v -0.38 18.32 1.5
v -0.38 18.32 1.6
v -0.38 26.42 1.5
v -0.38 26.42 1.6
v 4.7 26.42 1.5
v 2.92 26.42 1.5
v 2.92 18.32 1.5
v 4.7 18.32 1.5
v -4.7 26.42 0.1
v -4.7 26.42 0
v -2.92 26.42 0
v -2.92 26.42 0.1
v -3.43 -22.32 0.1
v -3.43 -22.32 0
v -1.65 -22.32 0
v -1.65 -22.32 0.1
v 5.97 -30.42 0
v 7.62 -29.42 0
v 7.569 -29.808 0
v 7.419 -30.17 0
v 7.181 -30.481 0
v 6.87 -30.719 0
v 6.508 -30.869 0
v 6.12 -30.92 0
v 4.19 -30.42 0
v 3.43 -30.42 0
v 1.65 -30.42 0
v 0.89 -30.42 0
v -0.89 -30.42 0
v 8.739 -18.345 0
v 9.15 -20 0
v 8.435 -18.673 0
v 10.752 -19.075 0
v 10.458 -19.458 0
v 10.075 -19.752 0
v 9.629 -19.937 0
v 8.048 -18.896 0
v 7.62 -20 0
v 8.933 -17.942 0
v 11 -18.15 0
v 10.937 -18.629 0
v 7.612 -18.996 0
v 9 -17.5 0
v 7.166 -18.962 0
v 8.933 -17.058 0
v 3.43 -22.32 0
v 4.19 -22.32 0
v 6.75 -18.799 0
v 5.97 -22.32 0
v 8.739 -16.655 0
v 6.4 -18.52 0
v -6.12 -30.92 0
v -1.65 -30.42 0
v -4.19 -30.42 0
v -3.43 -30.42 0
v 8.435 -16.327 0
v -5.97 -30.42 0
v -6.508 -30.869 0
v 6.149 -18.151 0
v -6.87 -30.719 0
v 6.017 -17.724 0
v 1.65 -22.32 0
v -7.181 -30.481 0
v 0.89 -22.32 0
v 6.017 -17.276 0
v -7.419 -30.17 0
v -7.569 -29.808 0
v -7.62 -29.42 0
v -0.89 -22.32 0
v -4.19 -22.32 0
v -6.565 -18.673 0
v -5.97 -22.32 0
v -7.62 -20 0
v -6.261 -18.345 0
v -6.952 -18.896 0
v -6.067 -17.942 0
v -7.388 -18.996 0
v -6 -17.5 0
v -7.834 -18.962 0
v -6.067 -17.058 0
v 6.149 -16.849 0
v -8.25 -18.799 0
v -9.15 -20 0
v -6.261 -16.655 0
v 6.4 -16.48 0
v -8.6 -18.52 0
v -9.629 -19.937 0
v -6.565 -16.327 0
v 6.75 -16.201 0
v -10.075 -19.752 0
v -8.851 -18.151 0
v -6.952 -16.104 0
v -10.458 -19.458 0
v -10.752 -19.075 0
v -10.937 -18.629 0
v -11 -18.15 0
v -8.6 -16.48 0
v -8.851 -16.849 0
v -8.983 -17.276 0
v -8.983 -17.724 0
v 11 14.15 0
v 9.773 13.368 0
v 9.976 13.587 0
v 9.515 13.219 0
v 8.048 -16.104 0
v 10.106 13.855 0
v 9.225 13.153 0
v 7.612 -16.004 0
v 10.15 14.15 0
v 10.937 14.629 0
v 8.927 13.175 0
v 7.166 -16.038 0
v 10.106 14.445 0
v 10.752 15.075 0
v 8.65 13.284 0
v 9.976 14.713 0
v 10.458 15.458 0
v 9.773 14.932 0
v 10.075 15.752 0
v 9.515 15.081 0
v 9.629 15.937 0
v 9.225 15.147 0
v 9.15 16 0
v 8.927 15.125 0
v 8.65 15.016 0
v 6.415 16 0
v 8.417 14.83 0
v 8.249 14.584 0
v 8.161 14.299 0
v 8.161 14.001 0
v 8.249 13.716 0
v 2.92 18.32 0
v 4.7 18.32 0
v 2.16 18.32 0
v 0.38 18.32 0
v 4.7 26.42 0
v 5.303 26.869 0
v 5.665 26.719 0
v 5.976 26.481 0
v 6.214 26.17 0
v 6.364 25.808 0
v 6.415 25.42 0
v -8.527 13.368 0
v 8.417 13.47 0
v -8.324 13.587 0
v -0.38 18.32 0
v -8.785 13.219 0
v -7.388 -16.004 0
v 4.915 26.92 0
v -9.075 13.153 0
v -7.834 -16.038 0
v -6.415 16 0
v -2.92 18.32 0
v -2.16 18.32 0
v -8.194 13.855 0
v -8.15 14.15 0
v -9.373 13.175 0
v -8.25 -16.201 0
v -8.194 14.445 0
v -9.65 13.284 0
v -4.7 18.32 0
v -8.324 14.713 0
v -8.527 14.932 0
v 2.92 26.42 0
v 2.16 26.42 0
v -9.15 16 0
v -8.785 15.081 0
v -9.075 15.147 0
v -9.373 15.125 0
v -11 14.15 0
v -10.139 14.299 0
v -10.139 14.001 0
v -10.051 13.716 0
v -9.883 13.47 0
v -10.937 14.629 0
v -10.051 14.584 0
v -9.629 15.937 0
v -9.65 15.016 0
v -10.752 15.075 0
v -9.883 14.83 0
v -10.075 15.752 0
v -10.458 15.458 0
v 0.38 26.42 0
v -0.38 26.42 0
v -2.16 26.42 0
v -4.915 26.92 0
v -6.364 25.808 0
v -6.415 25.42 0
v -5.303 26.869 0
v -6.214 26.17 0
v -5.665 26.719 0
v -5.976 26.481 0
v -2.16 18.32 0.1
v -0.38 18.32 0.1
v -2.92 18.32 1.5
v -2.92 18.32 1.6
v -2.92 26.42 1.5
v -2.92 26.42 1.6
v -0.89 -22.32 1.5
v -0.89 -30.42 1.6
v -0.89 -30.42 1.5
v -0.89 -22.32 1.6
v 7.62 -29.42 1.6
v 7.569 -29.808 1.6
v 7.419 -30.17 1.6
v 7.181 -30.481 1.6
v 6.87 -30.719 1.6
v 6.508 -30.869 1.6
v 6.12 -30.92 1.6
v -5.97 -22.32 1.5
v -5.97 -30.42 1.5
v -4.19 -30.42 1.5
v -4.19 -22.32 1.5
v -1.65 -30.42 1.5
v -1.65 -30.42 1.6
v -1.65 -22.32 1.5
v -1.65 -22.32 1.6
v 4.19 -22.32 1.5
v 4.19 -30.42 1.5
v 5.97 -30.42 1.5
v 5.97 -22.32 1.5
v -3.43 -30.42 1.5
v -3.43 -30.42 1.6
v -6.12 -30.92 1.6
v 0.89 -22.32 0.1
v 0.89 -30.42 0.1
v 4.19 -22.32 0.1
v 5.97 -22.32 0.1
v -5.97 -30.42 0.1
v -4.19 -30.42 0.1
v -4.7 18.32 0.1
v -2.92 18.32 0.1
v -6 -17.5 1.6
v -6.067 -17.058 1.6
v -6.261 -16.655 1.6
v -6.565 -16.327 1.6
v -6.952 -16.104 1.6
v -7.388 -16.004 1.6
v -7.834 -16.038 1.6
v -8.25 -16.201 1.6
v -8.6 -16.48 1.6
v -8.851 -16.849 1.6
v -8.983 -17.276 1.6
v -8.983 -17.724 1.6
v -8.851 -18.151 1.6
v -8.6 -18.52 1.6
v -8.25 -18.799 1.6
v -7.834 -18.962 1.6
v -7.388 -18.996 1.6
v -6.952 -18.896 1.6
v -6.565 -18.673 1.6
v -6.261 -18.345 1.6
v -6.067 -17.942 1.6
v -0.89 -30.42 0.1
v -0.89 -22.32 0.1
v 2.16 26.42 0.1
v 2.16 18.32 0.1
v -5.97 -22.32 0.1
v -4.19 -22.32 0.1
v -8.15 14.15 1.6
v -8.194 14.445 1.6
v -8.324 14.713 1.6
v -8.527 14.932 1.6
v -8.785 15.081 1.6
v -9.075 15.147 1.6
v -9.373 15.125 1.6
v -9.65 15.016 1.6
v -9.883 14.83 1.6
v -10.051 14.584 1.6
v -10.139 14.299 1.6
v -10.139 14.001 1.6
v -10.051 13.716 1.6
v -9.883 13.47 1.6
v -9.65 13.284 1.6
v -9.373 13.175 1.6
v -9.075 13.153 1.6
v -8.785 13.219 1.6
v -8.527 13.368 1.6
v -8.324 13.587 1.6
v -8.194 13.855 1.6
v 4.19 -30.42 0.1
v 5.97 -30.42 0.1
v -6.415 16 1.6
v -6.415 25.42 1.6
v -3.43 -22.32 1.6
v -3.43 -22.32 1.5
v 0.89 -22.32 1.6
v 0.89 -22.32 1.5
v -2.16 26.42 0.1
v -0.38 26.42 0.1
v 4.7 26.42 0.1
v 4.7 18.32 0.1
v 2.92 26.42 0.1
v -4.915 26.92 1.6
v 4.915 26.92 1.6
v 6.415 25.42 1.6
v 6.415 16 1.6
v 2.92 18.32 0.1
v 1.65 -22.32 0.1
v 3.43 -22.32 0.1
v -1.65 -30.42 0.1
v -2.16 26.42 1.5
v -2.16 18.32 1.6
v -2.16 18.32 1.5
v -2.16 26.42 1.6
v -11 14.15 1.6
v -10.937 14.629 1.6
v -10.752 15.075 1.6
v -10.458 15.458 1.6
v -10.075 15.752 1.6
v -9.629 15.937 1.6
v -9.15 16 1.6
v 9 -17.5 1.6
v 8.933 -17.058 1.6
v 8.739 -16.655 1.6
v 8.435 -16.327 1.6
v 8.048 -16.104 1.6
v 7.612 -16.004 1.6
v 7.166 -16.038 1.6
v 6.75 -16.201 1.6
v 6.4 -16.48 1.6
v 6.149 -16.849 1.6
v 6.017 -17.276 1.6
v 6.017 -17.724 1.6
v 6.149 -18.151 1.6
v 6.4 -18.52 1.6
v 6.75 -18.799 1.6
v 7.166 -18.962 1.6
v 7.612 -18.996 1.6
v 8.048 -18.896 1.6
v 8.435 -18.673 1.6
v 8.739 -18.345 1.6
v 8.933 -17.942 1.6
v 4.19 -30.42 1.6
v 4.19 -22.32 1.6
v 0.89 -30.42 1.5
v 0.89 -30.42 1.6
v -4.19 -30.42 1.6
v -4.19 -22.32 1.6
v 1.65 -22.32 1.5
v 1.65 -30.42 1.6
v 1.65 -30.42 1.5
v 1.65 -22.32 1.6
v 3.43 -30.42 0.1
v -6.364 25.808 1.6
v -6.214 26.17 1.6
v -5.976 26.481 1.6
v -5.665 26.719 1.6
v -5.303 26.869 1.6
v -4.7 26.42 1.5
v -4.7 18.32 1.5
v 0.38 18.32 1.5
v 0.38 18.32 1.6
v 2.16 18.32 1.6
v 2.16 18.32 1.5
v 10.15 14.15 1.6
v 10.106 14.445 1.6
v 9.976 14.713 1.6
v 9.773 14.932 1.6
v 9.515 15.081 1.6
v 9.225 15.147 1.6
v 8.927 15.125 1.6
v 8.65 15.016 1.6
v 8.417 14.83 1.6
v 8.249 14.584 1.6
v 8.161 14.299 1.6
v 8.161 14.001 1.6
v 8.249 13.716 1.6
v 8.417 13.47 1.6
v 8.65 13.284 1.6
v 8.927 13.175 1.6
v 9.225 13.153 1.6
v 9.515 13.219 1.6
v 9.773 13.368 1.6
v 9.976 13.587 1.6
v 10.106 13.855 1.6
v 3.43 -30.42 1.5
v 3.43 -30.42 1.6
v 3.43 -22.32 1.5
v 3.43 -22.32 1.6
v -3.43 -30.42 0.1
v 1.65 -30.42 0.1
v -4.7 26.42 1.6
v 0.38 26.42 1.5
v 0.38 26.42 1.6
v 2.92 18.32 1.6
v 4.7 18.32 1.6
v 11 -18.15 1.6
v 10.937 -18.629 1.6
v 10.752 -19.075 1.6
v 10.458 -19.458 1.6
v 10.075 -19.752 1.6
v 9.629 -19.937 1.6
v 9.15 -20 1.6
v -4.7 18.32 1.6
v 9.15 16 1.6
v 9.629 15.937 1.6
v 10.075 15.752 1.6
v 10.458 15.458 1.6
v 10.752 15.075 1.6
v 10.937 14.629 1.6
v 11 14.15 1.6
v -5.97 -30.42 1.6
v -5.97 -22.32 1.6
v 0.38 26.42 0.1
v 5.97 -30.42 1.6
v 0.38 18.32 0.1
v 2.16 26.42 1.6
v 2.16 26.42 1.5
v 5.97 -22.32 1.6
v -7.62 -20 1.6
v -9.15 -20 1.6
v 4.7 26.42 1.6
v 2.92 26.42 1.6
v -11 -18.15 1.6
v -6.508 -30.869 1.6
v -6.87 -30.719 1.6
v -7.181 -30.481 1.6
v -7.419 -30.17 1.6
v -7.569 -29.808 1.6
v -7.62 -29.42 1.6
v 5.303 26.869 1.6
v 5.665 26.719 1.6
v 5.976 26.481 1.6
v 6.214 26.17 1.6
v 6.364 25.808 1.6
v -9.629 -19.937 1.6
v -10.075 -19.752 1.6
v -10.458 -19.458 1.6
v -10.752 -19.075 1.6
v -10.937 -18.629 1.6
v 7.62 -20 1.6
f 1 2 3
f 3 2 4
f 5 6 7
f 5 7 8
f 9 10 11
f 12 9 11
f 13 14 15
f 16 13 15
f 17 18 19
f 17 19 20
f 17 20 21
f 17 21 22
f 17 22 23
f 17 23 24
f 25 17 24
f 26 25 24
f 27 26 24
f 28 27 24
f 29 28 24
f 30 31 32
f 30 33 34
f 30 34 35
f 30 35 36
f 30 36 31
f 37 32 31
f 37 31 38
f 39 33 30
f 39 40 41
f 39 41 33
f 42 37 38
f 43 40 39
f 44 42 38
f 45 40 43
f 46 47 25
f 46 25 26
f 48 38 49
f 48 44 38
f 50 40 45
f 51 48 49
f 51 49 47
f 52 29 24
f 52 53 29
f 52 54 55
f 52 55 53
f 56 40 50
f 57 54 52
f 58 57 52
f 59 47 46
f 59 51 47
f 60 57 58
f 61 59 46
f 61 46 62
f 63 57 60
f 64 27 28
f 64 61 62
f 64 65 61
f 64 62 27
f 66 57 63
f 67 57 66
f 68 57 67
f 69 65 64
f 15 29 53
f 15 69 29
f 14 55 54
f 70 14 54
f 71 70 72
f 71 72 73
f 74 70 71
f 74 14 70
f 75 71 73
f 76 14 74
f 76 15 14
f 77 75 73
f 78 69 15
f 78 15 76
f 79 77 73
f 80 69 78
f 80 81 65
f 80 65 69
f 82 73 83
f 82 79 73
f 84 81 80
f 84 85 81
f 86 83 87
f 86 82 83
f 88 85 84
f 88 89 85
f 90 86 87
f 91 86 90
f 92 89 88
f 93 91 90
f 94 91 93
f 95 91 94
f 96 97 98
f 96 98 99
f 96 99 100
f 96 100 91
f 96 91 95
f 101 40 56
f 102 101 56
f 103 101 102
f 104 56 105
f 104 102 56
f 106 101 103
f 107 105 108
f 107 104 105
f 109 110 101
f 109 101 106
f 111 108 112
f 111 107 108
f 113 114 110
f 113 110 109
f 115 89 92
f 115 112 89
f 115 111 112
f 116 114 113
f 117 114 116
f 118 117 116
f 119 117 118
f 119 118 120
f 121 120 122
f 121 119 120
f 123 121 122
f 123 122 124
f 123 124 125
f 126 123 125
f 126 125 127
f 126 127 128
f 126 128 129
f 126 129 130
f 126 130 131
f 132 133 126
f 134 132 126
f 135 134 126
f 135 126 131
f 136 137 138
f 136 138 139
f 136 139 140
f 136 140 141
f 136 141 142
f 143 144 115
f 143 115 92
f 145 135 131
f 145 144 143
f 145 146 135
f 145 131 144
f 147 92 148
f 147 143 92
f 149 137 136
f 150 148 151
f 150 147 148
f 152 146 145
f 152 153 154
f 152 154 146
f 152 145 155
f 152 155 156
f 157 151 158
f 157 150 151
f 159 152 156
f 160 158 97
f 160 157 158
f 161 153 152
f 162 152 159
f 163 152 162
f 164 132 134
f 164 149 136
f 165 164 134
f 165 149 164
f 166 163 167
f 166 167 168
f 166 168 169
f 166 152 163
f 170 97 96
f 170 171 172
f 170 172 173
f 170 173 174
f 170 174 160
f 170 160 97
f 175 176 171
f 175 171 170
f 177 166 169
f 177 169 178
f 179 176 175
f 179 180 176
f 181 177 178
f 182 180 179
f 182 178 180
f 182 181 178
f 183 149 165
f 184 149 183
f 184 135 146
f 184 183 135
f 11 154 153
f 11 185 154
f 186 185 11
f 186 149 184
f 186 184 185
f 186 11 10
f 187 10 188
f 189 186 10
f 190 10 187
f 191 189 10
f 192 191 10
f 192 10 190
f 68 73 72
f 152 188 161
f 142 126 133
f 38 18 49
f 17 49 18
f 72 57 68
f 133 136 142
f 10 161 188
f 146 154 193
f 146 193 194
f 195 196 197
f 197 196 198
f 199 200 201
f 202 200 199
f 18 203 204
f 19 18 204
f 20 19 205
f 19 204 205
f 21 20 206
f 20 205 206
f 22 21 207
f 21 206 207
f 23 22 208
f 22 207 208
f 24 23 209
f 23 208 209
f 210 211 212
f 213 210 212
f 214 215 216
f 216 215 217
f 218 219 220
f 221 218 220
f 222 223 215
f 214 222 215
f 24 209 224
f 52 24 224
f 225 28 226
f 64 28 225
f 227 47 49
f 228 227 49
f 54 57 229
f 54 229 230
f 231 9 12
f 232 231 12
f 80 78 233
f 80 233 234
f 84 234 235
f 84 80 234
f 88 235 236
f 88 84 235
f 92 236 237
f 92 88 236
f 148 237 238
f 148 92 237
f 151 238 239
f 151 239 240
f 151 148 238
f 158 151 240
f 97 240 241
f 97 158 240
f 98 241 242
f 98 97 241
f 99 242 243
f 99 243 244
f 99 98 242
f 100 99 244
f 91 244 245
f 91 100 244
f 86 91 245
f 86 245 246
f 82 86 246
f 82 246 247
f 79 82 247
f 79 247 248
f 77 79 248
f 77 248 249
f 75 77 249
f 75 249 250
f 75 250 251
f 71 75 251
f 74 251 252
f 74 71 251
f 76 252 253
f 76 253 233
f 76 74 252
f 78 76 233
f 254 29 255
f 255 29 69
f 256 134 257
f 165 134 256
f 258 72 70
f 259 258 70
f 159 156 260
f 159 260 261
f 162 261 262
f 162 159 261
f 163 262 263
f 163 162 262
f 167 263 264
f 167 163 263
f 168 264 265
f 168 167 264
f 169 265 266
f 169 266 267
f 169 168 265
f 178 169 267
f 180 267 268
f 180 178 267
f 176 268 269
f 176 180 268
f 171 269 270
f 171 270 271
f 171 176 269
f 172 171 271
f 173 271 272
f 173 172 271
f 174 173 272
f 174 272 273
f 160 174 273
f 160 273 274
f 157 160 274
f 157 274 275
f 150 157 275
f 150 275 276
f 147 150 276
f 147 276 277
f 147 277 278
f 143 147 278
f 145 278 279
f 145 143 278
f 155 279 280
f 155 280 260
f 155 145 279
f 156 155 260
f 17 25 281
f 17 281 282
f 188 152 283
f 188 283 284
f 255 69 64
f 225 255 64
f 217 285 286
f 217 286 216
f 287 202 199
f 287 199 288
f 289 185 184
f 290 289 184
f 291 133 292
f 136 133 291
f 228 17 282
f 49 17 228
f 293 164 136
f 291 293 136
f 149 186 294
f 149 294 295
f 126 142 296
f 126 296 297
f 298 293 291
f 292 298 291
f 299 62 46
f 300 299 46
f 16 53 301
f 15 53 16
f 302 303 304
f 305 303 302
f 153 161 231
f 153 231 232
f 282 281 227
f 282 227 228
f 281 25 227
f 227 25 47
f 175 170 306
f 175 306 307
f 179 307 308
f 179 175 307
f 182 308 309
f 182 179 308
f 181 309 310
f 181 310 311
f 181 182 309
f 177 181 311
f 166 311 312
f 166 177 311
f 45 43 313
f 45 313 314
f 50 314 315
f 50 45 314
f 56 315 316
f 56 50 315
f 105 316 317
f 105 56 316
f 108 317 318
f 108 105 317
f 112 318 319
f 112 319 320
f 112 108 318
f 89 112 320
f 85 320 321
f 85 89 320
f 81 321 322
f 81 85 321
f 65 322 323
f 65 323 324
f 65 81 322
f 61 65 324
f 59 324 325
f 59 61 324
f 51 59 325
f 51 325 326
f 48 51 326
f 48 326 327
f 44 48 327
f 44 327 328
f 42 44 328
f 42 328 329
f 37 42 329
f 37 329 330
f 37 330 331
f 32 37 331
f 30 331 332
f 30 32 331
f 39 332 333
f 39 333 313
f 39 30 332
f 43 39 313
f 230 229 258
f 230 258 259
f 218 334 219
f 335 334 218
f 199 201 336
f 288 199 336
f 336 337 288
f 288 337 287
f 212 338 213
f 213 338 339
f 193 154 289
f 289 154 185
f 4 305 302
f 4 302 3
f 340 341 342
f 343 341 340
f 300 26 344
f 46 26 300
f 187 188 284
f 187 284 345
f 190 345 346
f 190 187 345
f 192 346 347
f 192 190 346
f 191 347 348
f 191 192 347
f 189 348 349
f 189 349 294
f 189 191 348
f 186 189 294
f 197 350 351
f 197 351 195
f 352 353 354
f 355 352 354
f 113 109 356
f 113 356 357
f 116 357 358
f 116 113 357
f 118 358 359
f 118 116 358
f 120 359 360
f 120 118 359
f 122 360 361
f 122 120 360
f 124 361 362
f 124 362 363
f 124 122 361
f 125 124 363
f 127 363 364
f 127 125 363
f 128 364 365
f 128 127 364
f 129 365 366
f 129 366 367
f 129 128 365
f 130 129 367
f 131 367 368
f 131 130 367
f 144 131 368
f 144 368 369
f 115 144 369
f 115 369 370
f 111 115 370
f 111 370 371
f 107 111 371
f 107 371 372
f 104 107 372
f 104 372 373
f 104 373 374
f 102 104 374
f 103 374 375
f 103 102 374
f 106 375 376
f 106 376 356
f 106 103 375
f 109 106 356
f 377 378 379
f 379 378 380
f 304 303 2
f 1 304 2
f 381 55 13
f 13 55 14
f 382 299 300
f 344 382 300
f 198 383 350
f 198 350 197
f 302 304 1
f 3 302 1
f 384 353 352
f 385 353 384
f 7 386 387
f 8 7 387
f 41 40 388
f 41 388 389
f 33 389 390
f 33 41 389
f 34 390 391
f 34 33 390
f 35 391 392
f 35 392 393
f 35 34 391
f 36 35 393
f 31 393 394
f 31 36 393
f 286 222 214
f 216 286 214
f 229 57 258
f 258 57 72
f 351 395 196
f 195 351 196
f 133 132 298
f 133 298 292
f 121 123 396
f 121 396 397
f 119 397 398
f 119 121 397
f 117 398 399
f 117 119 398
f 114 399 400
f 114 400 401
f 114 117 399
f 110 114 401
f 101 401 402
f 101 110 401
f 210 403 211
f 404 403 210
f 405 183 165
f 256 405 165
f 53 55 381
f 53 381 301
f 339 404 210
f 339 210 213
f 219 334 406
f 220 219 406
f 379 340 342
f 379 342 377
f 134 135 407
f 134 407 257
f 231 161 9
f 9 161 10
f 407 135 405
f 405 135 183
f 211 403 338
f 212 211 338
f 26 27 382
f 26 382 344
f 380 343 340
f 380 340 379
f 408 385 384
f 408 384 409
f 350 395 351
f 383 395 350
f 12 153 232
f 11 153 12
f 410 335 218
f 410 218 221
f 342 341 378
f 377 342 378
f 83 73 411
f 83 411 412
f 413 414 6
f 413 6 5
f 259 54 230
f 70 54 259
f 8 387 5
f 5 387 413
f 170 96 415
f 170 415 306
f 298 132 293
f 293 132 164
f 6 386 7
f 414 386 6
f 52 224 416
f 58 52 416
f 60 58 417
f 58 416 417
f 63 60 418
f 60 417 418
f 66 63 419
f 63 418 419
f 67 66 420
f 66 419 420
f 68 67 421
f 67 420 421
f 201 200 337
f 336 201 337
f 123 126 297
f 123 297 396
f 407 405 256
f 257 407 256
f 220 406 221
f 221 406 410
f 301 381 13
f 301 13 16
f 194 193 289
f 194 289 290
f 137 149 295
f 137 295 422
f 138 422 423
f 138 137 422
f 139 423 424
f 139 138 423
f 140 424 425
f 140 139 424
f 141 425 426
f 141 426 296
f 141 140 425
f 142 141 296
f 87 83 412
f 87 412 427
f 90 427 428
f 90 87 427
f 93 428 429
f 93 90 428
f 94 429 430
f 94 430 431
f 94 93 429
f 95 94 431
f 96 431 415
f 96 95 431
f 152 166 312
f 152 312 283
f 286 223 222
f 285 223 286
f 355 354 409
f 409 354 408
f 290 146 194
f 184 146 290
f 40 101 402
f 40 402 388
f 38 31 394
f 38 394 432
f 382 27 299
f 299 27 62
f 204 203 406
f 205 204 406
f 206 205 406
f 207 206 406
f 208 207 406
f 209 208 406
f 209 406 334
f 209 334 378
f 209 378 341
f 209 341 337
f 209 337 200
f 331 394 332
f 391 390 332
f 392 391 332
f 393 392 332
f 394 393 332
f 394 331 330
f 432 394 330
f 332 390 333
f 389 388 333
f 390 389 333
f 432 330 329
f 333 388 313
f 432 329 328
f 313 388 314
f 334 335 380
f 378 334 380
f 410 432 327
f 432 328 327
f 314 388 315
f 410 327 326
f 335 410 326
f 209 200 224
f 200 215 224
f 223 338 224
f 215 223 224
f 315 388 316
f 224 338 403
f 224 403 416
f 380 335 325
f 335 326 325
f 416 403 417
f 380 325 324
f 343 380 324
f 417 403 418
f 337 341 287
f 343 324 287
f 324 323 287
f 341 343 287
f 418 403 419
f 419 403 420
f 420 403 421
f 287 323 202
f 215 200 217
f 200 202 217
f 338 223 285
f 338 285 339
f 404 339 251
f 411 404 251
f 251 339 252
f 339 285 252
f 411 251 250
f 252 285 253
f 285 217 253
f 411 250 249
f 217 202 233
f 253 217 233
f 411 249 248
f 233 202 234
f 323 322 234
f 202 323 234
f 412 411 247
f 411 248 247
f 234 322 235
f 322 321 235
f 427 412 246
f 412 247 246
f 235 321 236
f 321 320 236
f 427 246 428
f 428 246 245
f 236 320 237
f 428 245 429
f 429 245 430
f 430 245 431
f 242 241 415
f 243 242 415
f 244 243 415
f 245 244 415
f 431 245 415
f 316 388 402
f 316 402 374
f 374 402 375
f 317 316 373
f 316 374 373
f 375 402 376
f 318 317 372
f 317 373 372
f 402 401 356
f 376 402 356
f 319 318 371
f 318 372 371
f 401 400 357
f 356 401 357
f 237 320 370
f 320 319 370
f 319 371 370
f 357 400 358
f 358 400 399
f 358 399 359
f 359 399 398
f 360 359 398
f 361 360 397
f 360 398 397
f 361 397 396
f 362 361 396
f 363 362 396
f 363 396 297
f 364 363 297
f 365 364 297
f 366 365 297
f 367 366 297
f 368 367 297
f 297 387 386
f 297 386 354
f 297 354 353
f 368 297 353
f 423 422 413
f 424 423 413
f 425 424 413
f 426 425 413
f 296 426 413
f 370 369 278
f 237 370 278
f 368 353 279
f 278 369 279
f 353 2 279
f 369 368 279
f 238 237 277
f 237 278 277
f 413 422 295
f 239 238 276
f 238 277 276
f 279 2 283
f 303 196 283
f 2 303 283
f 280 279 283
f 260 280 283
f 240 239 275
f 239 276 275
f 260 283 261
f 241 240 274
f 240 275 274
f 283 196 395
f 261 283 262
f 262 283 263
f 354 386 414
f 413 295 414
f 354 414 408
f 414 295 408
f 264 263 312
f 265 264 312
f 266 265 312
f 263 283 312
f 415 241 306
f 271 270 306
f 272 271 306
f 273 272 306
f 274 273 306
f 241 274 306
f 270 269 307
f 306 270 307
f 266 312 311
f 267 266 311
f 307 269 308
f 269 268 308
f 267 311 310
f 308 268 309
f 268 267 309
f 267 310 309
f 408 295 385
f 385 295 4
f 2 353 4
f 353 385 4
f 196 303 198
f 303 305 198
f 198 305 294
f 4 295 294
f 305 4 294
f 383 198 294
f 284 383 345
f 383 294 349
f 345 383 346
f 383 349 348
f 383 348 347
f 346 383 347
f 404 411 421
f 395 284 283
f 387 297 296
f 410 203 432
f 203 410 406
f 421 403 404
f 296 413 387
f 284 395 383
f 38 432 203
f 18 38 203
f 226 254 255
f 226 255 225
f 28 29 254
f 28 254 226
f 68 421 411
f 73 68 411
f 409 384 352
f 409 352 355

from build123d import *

# Parameters (mm, degrees)
SKETCH_1_R          = 1
EXTRUDE_1_DEPTH     = 1.6
SKETCH_3_R          = 1.5
CUT_EXTRUDE_1_DEPTH = 1.6
CUT_EXTRUDE_2_DEPTH = 1.6
EXTRUDE_2_DEPTH     = 1.6
SKETCH_8_W          = 1.78
SKETCH_8_H          = 8.1
CUT_EXTRUDE_3_DEPTH = 0.1
CUT_EXTRUDE_START   = 1.6
SKETCH_9_W          = 1.78
SKETCH_9_H          = 8.1
CUT_EXTRUDE_4_DEPTH = 0.1
EXTRUDE_START       = 1.6
EXTRUDE_3_DEPTH     = 1.6
SKETCH_12_W         = 1.78
SKETCH_12_H         = 8.1
CUT_EXTRUDE_5_DEPTH = 0.1
SKETCH_13_W         = 1.78
SKETCH_13_H         = 8.1
CUT_EXTRUDE_6_DEPTH = 0.1


with BuildPart() as part:
    # 草图1 → 凸台-拉伸1 (new body)
    with BuildSketch(Plane.XY):
        with BuildLine():
            Line((-9.15, 16), (9.15, 16))
            ThreePointArc((9.15, 16), (10.458147545, 15.458147545), (11, 14.15))
            Line((11, 14.15), (11, -20))
            Line((11, -20), (-11, -20))
            Line((-11, -20), (-11, 14.15))
            ThreePointArc((-11, 14.15), (-10.458147545, 15.458147545), (-9.15, 16))
        make_face()
        with Locations((-9.15, 14.15)):
            Circle(SKETCH_1_R, mode=Mode.SUBTRACT)
        with Locations((9.15, 14.15)):
            Circle(SKETCH_1_R, mode=Mode.SUBTRACT)
    extrude(amount=EXTRUDE_1_DEPTH)

    # 草图3 → 切除-拉伸1 (cut)
    with BuildSketch(Plane.XY):
        with Locations((-7.5, -17.5)):
            Circle(SKETCH_3_R)
        with Locations((7.5, -17.5)):
            Circle(SKETCH_3_R)
    extrude(amount=CUT_EXTRUDE_1_DEPTH, mode=Mode.SUBTRACT)

    # 草图5 → 切除-拉伸2 (cut)
    with BuildSketch(Plane.XY):
        with BuildLine():
            Line((11, -20), (11, -18.15))
            ThreePointArc((11, -18.15), (10.458147545, -19.458147545), (9.15, -20))
            Line((9.15, -20), (11, -20))
        make_face()
        with BuildLine():
            Line((-11, -20), (-9.15, -20))
            ThreePointArc((-9.15, -20), (-10.458147545, -19.458147545), (-11, -18.15))
            Line((-11, -18.15), (-11, -20))
        make_face()
    extrude(amount=CUT_EXTRUDE_2_DEPTH, mode=Mode.SUBTRACT)

    # 草图7 → 凸台-拉伸2 (add)
    with BuildSketch(Plane.XY):
        with BuildLine():
            Line((-4.915, 26.92), (4.915, 26.92))
            ThreePointArc((4.915, 26.92), (5.975660172, 26.480660172), (6.415, 25.42))
            Line((6.415, 25.42), (6.415, 16))
            Line((6.415, 16), (-6.415, 16))
            Line((-6.415, 16), (-6.415, 25.42))
            ThreePointArc((-6.415, 25.42), (-5.975660172, 26.480660172), (-4.915, 26.92))
        make_face()
        with BuildLine():
            Line((-6.415, -20), (6.415, -20))
            Line((6.415, -20), (6.415, -29.42))
            ThreePointArc((6.415, -29.42), (5.975660172, -30.480660172), (4.915, -30.92))
            Line((4.915, -30.92), (-4.915, -30.92))
            ThreePointArc((-4.915, -30.92), (-5.975660172, -30.480660172), (-6.415, -29.42))
            Line((-6.415, -29.42), (-6.415, -20))
        make_face()
    extrude(amount=EXTRUDE_2_DEPTH)

    # 草图8 → 切除-拉伸3 (cut)
    with BuildSketch(Plane.XY):
        with Locations((-1.27, 22.37)):
            Rectangle(SKETCH_8_W, SKETCH_8_H)
        with Locations((-3.81, 22.37)):
            Rectangle(SKETCH_8_W, SKETCH_8_H)
        with Locations((3.81, 22.37)):
            Rectangle(SKETCH_8_W, SKETCH_8_H)
        with Locations((1.27, 22.37)):
            Rectangle(SKETCH_8_W, SKETCH_8_H)
        with Locations((1.27, -26.37)):
            Rectangle(SKETCH_8_W, SKETCH_8_H)
        with Locations((3.81, -26.37)):
            Rectangle(SKETCH_8_W, SKETCH_8_H)
        with Locations((-3.81, -26.37)):
            Rectangle(SKETCH_8_W, SKETCH_8_H)
        with Locations((-1.27, -26.37)):
            Rectangle(SKETCH_8_W, SKETCH_8_H)
    extrude(amount=CUT_EXTRUDE_3_DEPTH, mode=Mode.SUBTRACT)

    # 草图9 → 切除-拉伸4 (cut)
    with BuildSketch(Plane.XY.offset(CUT_EXTRUDE_START)):
        with Locations((-1.27, 22.37)):
            Rectangle(SKETCH_9_W, SKETCH_9_H)
        with Locations((1.27, 22.37)):
            Rectangle(SKETCH_9_W, SKETCH_9_H)
        with Locations((3.81, 22.37)):
            Rectangle(SKETCH_9_W, SKETCH_9_H)
        with Locations((-3.81, 22.37)):
            Rectangle(SKETCH_9_W, SKETCH_9_H)
        with Locations((-1.27, -26.37)):
            Rectangle(SKETCH_9_W, SKETCH_9_H)
        with Locations((-3.81, -26.37)):
            Rectangle(SKETCH_9_W, SKETCH_9_H)
        with Locations((3.81, -26.37)):
            Rectangle(SKETCH_9_W, SKETCH_9_H)
        with Locations((1.27, -26.37)):
            Rectangle(SKETCH_9_W, SKETCH_9_H)
    extrude(amount=-CUT_EXTRUDE_4_DEPTH, mode=Mode.SUBTRACT)

    # 草图11 → 凸台-拉伸3 (add)
    with BuildSketch(Plane.XY.offset(EXTRUDE_START)):
        with BuildLine():
            Line((-7.62, -20), (7.62, -20))
            Line((7.62, -20), (7.62, -29.42))
            ThreePointArc((7.62, -29.42), (7.180660172, -30.480660172), (6.12, -30.92))
            Line((6.12, -30.92), (-6.12, -30.92))
            ThreePointArc((-6.12, -30.92), (-7.180660172, -30.480660172), (-7.62, -29.42))
            Line((-7.62, -29.42), (-7.62, -20))
        make_face()
    extrude(amount=-EXTRUDE_3_DEPTH)

    # 草图12 → 切除-拉伸5 (cut)
    with BuildSketch(Plane.XY):
        with Locations((0, -26.37)):
            Rectangle(SKETCH_12_W, SKETCH_12_H)
        with Locations((2.54, -26.37)):
            Rectangle(SKETCH_12_W, SKETCH_12_H)
        with Locations((5.08, -26.37)):
            Rectangle(SKETCH_12_W, SKETCH_12_H)
        with Locations((-2.54, -26.37)):
            Rectangle(SKETCH_12_W, SKETCH_12_H)
        with Locations((-5.08, -26.37)):
            Rectangle(SKETCH_12_W, SKETCH_12_H)
    extrude(amount=CUT_EXTRUDE_5_DEPTH, mode=Mode.SUBTRACT)

    # 草图13 → 切除-拉伸6 (cut)
    with BuildSketch(Plane.XY.offset(CUT_EXTRUDE_START)):
        with Locations((2.54, -26.37)):
            Rectangle(SKETCH_13_W, SKETCH_13_H)
        with Locations((0, -26.37)):
            Rectangle(SKETCH_13_W, SKETCH_13_H)
        with Locations((-5.08, -26.37)):
            Rectangle(SKETCH_13_W, SKETCH_13_H)
        with Locations((-2.54, -26.37)):
            Rectangle(SKETCH_13_W, SKETCH_13_H)
        with Locations((5.08, -26.37)):
            Rectangle(SKETCH_13_W, SKETCH_13_H)
    extrude(amount=-CUT_EXTRUDE_6_DEPTH, mode=Mode.SUBTRACT)


solid = part.part
